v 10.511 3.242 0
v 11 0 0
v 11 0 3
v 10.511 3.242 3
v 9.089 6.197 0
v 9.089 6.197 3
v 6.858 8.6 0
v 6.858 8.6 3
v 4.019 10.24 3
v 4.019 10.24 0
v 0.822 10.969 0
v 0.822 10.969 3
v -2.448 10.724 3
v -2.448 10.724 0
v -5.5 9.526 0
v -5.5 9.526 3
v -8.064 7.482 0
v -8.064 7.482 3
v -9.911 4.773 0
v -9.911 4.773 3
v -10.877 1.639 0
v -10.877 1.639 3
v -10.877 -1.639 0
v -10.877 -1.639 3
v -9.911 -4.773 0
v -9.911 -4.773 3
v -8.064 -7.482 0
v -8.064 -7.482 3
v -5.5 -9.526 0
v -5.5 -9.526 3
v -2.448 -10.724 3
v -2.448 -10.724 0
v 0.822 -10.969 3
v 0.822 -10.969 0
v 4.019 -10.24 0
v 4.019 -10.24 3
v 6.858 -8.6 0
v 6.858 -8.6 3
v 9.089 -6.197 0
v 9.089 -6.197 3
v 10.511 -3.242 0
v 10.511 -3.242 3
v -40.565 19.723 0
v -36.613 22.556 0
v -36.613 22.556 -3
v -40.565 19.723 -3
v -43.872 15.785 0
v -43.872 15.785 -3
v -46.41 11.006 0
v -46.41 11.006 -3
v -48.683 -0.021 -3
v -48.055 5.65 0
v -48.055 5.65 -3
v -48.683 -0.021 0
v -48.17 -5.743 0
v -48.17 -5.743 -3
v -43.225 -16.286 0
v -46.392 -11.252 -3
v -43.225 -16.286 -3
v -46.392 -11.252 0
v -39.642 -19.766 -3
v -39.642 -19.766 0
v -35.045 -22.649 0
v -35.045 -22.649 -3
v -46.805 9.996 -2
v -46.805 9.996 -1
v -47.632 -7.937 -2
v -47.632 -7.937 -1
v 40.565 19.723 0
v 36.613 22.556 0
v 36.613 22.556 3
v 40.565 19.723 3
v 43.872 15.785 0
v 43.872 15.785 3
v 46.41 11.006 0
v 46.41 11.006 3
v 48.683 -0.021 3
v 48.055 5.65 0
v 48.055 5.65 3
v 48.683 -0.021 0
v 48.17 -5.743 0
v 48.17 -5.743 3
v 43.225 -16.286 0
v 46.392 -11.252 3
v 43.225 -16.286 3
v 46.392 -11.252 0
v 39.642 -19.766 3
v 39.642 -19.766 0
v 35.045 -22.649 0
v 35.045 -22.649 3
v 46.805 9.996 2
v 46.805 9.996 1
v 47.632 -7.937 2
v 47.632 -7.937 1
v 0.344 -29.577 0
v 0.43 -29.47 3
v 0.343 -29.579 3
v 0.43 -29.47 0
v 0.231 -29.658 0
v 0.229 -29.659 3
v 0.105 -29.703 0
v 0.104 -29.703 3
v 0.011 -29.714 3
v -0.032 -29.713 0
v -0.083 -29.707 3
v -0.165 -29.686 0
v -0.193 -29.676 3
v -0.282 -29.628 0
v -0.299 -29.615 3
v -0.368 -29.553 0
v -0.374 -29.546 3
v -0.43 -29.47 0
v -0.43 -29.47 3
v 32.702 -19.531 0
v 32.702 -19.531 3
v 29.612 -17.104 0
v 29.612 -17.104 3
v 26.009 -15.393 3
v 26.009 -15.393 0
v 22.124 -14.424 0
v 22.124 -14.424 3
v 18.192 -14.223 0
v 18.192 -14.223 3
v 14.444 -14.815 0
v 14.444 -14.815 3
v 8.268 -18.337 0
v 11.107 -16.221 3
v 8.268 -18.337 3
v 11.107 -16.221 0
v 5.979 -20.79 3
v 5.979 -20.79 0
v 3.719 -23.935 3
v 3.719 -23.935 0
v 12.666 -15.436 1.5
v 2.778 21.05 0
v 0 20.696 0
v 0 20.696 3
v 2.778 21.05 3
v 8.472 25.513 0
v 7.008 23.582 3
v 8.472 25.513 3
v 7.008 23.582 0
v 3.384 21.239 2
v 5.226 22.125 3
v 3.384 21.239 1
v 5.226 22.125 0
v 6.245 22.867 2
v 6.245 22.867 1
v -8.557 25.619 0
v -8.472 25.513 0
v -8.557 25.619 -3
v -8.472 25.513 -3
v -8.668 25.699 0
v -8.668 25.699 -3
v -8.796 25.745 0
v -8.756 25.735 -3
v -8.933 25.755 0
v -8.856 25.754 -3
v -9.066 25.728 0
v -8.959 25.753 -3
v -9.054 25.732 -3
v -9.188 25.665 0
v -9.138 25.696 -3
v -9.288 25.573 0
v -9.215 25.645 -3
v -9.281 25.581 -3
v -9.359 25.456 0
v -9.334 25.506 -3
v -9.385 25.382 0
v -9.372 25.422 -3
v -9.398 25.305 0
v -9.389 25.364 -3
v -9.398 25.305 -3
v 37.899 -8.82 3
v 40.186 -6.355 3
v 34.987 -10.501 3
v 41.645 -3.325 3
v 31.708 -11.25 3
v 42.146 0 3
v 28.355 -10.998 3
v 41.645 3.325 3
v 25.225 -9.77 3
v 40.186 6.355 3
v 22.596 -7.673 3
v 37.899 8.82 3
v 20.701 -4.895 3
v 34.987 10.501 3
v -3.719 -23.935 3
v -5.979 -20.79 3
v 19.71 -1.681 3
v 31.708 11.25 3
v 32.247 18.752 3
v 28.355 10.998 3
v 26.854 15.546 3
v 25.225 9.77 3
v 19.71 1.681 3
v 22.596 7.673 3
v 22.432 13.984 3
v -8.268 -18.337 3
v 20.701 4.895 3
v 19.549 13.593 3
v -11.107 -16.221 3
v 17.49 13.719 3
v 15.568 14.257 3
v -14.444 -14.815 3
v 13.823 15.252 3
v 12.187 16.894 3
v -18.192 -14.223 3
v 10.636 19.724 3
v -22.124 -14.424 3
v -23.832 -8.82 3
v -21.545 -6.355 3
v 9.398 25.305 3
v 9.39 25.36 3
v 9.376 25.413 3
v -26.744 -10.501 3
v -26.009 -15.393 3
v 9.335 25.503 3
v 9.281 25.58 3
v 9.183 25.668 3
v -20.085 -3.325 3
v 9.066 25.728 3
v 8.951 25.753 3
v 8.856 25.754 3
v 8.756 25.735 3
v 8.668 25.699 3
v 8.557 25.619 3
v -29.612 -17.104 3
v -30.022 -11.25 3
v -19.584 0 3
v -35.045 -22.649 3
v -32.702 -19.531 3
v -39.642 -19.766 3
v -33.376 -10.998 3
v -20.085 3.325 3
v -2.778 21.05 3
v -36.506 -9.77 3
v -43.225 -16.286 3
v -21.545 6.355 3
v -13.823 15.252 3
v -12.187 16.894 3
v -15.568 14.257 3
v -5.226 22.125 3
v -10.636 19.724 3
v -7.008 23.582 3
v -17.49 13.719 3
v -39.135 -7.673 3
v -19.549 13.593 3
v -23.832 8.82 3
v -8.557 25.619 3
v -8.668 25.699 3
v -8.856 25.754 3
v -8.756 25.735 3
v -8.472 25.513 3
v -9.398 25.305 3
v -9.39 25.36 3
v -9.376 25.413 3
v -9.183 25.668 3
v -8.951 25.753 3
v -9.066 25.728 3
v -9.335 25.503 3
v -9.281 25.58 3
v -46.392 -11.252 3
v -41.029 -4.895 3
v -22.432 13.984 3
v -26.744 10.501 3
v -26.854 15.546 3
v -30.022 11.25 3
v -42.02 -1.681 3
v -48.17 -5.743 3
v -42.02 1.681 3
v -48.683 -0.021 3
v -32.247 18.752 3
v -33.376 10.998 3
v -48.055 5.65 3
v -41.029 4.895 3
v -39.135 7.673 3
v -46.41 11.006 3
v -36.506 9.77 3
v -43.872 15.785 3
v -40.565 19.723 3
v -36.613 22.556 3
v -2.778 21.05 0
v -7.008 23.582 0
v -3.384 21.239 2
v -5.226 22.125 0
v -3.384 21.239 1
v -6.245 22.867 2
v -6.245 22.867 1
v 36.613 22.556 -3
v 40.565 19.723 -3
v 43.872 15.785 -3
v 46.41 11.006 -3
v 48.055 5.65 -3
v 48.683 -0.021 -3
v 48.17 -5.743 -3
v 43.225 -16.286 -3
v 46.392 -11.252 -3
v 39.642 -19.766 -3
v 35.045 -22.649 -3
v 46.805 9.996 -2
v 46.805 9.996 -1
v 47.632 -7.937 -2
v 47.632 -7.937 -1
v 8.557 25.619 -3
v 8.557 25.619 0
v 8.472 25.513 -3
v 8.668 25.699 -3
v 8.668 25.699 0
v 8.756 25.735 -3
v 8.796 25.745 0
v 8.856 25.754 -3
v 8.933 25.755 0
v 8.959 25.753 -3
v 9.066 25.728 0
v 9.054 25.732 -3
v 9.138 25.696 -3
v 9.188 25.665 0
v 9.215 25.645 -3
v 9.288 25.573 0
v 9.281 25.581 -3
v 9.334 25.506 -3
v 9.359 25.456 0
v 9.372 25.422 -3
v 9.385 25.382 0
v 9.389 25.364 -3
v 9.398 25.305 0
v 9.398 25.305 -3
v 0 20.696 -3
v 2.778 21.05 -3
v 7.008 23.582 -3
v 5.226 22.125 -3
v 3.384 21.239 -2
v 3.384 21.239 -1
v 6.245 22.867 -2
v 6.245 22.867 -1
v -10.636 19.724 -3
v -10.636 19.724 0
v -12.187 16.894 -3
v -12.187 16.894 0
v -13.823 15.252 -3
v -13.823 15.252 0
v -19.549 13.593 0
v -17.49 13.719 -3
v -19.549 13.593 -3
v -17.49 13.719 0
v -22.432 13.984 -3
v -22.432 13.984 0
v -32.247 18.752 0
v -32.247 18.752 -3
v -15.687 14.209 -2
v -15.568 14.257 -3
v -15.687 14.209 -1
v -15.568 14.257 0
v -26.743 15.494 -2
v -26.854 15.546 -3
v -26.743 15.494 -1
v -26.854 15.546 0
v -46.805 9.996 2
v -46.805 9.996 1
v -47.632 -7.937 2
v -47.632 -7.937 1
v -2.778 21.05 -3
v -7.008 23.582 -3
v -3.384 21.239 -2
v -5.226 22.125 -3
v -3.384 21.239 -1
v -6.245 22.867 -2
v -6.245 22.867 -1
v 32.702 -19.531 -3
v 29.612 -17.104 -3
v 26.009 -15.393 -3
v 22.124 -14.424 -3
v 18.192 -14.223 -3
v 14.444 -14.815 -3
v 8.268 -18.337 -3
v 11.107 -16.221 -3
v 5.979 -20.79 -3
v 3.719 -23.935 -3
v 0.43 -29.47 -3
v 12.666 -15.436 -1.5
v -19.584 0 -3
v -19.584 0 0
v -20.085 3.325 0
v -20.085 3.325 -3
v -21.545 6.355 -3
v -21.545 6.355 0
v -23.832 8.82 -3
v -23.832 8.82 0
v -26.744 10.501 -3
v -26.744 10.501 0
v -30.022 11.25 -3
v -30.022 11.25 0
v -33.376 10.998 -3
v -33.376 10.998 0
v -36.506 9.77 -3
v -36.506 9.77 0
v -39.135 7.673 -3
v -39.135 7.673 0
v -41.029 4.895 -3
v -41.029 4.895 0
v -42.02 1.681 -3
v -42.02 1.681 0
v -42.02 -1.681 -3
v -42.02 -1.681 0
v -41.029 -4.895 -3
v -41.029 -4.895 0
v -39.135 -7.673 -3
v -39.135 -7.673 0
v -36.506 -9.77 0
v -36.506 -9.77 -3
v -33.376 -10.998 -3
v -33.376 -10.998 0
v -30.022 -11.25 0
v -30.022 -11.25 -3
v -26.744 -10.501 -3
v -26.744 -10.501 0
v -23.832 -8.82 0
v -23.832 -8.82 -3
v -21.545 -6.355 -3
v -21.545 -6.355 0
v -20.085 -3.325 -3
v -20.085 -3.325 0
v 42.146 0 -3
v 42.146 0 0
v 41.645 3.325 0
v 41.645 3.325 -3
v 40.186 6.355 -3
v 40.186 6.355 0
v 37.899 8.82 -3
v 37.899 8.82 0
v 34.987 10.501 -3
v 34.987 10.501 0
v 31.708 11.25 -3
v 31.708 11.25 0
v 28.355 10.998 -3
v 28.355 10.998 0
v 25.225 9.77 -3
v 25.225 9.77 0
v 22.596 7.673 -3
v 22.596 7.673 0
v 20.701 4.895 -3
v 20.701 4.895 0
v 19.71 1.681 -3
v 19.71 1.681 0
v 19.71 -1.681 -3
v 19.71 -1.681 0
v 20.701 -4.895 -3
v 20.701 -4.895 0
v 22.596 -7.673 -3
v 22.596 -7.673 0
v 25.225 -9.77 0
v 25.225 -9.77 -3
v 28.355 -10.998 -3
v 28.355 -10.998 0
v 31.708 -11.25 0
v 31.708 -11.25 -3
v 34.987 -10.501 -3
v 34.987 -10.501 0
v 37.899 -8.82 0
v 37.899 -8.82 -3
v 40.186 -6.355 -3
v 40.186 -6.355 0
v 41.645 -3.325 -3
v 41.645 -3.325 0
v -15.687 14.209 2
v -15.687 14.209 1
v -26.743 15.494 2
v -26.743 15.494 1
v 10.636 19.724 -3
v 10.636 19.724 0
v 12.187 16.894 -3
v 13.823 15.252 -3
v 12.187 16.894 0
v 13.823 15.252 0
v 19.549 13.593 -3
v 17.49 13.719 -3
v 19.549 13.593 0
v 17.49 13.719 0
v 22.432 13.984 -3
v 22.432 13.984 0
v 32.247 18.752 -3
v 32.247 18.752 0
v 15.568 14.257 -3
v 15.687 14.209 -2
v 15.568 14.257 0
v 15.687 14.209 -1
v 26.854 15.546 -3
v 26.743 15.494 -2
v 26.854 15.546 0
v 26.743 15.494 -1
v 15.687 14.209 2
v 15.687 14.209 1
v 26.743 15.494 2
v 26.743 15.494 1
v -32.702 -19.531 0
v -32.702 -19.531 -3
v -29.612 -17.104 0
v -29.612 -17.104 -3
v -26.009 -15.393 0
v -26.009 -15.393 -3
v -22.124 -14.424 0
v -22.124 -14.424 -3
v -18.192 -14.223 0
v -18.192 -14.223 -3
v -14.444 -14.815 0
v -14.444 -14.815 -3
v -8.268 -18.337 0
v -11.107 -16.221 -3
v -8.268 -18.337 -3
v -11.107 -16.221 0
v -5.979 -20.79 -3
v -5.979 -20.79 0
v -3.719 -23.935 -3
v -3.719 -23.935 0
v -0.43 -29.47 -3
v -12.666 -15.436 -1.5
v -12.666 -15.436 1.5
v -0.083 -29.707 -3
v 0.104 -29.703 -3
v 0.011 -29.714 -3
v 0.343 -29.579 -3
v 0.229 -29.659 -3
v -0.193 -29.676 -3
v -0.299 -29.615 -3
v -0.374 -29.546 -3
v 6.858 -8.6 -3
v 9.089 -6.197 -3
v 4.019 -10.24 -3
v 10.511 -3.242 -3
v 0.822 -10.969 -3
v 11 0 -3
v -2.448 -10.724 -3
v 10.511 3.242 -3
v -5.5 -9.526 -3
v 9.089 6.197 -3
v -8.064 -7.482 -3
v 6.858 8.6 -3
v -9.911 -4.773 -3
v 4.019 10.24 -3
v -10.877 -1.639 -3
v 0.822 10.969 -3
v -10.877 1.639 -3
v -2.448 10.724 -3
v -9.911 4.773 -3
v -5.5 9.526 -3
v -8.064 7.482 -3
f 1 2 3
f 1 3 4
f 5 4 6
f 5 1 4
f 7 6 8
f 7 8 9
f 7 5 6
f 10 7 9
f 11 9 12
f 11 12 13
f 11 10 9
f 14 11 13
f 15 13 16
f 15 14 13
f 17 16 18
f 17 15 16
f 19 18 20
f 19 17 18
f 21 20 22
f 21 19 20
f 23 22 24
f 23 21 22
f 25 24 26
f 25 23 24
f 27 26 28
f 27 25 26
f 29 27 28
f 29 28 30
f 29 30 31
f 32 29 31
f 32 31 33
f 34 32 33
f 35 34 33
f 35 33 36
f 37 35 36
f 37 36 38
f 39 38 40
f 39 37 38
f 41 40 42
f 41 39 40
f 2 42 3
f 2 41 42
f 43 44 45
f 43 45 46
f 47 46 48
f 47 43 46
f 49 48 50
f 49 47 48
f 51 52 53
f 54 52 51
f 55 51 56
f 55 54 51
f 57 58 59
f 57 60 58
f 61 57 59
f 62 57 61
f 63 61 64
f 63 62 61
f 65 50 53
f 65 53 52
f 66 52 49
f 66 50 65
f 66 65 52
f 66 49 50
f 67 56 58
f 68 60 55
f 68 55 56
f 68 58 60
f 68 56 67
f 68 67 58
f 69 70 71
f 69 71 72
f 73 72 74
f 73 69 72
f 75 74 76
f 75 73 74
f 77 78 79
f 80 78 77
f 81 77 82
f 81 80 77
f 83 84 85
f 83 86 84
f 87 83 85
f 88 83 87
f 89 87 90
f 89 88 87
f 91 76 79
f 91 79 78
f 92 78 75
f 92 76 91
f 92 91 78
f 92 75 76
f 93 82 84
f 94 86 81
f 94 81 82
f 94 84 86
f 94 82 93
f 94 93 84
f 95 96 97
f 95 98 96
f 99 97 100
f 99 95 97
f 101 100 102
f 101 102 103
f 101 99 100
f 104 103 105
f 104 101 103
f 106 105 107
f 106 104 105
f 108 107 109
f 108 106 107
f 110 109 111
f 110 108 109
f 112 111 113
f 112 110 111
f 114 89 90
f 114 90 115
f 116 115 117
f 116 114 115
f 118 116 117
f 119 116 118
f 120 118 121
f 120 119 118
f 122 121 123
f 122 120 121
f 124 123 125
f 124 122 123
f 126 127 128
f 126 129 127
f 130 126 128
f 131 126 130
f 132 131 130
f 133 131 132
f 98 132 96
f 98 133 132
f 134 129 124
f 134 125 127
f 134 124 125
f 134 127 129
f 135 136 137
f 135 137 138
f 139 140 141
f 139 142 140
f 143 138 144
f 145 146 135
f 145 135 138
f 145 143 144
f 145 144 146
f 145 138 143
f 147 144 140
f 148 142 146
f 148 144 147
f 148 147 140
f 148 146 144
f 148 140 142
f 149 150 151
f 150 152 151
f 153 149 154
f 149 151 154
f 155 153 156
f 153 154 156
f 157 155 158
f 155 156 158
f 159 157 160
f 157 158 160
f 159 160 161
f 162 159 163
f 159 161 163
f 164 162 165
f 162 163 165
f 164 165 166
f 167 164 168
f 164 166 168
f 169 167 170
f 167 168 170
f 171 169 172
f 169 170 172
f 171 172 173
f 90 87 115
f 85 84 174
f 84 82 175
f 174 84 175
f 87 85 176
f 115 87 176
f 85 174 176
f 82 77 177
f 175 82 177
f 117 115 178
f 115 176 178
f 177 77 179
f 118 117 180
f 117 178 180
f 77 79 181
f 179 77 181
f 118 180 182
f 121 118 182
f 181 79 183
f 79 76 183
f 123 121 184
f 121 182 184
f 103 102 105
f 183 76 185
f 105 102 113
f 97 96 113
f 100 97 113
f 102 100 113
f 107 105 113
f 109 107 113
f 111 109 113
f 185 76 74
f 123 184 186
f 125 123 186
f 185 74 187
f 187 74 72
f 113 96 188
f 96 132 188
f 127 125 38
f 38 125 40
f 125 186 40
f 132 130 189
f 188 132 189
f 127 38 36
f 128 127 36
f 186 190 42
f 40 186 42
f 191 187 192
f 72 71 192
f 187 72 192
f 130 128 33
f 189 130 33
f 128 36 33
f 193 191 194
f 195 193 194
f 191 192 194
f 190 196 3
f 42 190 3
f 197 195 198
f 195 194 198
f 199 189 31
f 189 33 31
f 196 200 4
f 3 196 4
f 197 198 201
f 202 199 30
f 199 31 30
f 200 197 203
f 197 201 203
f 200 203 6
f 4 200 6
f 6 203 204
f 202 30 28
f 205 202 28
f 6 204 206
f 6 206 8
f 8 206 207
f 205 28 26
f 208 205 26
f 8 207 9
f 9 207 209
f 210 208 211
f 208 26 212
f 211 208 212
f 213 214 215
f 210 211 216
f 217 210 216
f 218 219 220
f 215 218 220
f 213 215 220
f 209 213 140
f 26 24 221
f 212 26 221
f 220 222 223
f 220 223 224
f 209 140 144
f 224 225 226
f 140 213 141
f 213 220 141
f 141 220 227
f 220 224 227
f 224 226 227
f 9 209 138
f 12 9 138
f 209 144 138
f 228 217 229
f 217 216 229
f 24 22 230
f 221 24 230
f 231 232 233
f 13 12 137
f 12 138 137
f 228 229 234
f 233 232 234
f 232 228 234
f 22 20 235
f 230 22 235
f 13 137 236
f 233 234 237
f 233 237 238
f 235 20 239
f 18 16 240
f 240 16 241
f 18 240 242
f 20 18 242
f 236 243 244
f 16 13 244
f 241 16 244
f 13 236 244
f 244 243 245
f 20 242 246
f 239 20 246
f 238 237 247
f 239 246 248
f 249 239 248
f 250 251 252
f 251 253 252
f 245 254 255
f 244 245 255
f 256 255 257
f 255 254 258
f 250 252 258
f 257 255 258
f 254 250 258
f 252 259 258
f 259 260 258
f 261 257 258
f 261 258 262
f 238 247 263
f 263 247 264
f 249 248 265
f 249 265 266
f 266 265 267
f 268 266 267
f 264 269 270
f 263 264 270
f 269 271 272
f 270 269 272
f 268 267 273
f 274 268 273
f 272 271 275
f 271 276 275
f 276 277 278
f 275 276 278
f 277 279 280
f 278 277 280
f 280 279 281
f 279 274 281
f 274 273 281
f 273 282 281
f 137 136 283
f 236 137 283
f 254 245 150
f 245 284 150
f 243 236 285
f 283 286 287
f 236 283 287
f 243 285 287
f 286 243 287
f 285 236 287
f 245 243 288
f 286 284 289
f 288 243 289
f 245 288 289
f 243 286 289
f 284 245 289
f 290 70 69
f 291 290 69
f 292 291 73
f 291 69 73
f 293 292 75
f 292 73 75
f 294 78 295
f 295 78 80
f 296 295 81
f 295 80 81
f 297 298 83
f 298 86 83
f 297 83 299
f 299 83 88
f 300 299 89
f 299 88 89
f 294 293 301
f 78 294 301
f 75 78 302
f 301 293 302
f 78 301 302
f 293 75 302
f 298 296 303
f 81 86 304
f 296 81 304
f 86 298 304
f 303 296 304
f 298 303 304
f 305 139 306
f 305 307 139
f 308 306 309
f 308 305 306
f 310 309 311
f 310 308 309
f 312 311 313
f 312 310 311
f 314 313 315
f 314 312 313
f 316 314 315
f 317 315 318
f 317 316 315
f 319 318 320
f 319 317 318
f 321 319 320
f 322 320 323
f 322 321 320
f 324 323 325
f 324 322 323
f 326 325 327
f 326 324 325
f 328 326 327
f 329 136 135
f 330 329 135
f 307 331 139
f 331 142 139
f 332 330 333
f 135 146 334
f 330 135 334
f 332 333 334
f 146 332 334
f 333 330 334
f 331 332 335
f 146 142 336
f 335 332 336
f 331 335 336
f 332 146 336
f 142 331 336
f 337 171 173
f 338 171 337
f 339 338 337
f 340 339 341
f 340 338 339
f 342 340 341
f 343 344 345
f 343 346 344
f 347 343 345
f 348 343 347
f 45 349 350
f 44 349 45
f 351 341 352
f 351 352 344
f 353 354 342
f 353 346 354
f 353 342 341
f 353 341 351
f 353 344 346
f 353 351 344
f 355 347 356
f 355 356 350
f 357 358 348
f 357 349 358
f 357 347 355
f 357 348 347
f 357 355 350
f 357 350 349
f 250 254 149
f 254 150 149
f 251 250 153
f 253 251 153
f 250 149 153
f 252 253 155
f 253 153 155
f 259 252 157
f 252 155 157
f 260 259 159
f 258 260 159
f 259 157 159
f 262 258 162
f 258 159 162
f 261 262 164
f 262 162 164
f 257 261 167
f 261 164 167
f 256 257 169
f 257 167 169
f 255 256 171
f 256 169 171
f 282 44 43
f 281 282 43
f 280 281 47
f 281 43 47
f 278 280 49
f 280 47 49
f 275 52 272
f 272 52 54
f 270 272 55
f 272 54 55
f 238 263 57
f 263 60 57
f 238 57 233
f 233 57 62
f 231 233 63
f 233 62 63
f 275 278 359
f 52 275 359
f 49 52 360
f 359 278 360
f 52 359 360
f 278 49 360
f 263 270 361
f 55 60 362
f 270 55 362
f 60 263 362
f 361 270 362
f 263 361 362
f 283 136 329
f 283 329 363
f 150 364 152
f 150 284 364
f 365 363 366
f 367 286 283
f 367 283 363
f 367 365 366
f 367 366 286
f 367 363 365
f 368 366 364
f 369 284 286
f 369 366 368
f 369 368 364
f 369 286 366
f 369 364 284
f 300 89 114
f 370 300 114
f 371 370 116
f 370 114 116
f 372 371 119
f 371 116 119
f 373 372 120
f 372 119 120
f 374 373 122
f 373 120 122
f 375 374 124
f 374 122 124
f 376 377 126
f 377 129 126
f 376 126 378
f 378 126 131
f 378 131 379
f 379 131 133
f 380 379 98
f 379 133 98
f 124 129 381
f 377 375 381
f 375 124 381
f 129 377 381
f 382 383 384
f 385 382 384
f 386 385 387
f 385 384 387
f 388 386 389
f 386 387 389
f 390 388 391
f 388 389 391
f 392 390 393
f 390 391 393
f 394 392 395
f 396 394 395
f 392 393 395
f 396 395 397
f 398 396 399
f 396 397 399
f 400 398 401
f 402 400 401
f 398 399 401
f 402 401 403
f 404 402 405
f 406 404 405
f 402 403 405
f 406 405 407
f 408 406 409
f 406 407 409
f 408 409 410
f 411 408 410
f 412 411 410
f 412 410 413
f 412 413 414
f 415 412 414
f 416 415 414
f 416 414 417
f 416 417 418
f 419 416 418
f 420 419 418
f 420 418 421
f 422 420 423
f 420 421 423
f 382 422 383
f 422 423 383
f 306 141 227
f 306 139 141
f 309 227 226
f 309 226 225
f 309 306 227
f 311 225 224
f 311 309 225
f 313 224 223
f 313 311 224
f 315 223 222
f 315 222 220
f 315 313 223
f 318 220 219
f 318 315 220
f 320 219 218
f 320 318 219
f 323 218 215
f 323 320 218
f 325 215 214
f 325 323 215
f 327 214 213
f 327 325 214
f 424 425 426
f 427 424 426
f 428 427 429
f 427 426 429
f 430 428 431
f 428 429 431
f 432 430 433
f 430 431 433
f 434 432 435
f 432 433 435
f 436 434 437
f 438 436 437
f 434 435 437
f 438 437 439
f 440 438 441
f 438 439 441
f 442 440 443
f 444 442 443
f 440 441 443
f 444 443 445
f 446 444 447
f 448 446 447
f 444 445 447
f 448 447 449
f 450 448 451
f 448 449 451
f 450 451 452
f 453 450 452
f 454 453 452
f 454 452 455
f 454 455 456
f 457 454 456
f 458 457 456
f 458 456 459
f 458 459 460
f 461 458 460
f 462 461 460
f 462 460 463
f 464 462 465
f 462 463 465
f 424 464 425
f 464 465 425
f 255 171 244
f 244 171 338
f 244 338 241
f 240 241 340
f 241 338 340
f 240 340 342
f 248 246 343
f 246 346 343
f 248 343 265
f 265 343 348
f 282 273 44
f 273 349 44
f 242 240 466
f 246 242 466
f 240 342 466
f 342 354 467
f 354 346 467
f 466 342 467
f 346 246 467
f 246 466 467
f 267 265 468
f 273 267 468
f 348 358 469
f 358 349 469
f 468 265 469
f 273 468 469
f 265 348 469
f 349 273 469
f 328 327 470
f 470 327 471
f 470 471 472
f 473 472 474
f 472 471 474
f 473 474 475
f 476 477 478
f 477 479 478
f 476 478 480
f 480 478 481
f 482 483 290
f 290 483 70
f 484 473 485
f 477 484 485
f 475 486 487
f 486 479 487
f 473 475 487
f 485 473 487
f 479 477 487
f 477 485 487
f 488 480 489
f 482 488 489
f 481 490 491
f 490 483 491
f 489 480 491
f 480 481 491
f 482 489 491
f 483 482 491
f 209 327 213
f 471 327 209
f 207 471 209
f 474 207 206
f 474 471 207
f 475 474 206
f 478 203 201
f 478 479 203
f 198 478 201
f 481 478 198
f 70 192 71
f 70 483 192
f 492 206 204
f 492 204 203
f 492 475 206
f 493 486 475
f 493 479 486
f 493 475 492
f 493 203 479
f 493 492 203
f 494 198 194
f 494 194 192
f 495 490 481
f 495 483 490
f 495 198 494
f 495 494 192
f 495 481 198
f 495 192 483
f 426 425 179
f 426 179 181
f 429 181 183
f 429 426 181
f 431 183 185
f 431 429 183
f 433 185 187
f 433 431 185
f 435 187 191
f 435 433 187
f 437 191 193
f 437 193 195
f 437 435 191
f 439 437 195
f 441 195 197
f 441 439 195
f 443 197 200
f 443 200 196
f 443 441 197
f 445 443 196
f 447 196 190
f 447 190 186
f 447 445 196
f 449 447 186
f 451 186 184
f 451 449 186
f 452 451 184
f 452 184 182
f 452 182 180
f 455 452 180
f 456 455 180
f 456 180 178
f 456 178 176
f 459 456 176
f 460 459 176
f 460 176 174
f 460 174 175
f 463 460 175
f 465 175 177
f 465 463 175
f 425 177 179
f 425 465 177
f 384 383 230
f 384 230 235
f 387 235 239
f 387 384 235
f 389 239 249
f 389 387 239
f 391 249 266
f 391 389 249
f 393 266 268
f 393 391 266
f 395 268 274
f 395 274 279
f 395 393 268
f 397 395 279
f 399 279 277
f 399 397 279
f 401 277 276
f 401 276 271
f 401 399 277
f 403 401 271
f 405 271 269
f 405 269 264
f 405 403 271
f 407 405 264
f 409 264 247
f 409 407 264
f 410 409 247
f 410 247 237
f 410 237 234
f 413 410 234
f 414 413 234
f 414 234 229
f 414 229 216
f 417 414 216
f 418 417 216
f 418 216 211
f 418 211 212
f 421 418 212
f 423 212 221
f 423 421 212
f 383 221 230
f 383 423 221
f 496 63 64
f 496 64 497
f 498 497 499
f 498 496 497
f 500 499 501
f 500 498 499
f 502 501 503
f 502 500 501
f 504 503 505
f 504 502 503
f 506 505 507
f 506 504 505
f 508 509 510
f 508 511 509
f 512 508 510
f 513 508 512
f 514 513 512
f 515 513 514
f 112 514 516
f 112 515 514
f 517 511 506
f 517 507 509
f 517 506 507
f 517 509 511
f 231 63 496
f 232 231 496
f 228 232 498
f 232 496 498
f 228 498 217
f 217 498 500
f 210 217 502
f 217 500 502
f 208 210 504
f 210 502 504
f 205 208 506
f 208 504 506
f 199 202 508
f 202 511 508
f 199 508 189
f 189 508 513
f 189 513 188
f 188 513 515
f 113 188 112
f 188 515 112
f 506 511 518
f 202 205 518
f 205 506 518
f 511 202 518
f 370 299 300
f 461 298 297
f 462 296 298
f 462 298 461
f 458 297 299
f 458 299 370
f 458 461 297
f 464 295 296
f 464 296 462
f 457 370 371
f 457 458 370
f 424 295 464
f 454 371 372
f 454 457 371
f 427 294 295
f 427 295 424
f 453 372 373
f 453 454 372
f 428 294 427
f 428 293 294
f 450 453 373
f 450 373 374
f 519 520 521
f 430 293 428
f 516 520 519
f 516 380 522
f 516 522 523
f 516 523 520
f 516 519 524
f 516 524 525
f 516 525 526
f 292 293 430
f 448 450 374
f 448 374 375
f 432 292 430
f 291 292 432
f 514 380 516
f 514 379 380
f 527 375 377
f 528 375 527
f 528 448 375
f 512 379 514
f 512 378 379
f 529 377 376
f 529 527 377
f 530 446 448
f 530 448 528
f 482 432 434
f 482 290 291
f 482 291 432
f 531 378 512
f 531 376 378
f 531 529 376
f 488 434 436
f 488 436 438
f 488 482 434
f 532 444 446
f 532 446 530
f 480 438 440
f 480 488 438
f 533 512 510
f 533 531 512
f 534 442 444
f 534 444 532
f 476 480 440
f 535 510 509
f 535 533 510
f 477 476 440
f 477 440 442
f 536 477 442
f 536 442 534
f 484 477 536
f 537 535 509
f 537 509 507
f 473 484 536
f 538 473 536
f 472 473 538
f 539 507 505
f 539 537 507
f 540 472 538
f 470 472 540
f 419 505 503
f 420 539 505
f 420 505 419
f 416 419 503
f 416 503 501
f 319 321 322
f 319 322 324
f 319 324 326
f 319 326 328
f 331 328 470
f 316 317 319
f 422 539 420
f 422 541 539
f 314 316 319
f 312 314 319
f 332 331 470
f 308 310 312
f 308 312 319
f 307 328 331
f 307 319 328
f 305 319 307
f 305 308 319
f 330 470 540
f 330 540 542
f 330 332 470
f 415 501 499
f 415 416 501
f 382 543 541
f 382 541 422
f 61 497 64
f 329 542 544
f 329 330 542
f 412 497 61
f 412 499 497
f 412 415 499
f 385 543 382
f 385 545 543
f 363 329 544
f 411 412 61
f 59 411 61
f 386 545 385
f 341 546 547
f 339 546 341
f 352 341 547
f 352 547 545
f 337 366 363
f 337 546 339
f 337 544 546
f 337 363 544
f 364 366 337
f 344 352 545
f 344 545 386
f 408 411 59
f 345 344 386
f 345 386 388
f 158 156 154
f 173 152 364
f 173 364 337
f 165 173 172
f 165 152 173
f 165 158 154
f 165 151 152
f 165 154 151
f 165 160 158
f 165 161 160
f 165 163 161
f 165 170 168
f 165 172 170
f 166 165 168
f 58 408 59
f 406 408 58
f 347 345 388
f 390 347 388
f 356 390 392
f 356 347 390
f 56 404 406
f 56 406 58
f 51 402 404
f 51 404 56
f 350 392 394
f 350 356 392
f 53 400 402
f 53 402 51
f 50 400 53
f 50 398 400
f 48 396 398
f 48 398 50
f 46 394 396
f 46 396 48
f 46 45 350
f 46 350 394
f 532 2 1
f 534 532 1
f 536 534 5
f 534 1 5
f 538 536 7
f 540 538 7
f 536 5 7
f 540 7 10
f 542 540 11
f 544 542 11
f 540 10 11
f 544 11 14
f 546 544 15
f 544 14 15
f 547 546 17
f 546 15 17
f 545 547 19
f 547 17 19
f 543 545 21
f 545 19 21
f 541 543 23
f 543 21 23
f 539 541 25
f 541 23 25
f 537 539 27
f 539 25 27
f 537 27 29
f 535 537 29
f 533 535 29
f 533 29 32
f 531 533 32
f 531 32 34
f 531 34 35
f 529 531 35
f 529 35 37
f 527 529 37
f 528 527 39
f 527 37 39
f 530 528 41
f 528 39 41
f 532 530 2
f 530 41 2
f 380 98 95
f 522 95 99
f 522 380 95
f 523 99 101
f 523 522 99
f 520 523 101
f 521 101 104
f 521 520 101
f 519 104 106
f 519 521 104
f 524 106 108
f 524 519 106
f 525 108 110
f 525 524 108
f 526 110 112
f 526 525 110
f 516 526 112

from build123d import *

# Parameters (mm, degrees)
F0_R     = 11.2811018545
F0_R_2   = 11
F1_DEPTH = 3
F2_R     = 0.5


with BuildPart() as f1:
    # F0 (on Top) → F1 (new body, symmetric)
    with BuildSketch(Plane.XY):
        with BuildLine():
            add(Edge.make_bspline(
                [(0, 20.6955336034), (4.176130984, 20.6701047719), (7.5252619572, 22.9629334062), (9.2714373022, 27.0963907242)],
                knots=[0, 0, 0, 0, 11.2663446392, 11.2663446392, 11.2663446392, 11.2663446392], degree=3))
            add(Edge.make_bspline(
                [(0, 20.6955336034), (-4.176130984, 20.6701047719), (-7.5252619572, 22.9629334062), (-9.2714373022, 27.0963907242)],
                knots=[0, 0, 0, 0, 11.2663446392, 11.2663446392, 11.2663446392, 11.2663446392], degree=3))
            add(Edge.make_bspline(
                [(-9.2714373022, 27.0963907242), (-10.252433829, 5.2865850739), (-29.1057825089, 14.5806018263), (-36.6129055619, 22.5558448583)],
                knots=[0, 0, 0, 0, 27.7159240033, 27.7159240033, 27.7159240033, 27.7159240033], degree=3))
            add(Edge.make_bspline(
                [(-36.6129055619, 22.5558448583), (-50.1396395266, 15.5486632138), (-55.6871630251, -12.4141490087), (-35.0454822183, -22.6485729218)],
                knots=[0, 0, 0, 0, 45.2315841285, 45.2315841285, 45.2315841285, 45.2315841285], degree=3))
            add(Edge.make_bspline(
                [(-35.0454822183, -22.6485729218), (-30.9359437749, -15.1486663001), (-9.8708452879, -9.8044342408), (-2.6448085105, -25.9140540409), (0, -30.179258436)],
                knots=[0, 0, 0, 0, 0.523784422, 1, 1, 1, 1], degree=3))
            add(Edge.make_bspline(
                [(35.0454822183, -22.6485729218), (30.9359437749, -15.1486663001), (9.8708452879, -9.8044342408), (2.6448085105, -25.9140540409), (0, -30.179258436)],
                knots=[0, 0, 0, 0, 0.523784422, 1, 1, 1, 1], degree=3))
            add(Edge.make_bspline(
                [(36.6129055619, 22.5558448583), (50.1396395266, 15.5486632138), (55.6871630251, -12.4141490087), (35.0454822183, -22.6485729218)],
                knots=[0, 0, 0, 0, 45.2315841285, 45.2315841285, 45.2315841285, 45.2315841285], degree=3))
            add(Edge.make_bspline(
                [(9.2714373022, 27.0963907242), (10.252433829, 5.2865850739), (29.1057825089, 14.5806018263), (36.6129055619, 22.5558448583)],
                knots=[0, 0, 0, 0, 27.7159240033, 27.7159240033, 27.7159240033, 27.7159240033], degree=3))
        make_face()
        with Locations((-30.8653861284, 0)):
            Circle(F0_R, mode=Mode.SUBTRACT)
        Circle(F0_R_2, mode=Mode.SUBTRACT)
        with Locations((30.8653861284, 0)):
            Circle(F0_R, mode=Mode.SUBTRACT)
    extrude(amount=F1_DEPTH, both=True)

    # F2
    f2_edges = [f1.edges().sort_by_distance(p)[0] for p in [
        (-9.271437, 27.096391, -1.5),
        (-9.271437, 27.096391, 1.5),
        (9.271437, 27.096391, -1.5),
        (9.271437, 27.096391, 1.5),
        (0, -30.179258, -1.5),
        (0, -30.179258, 1.5),
    ]]
    fillet(f2_edges, radius=F2_R)


solid = f1.part
